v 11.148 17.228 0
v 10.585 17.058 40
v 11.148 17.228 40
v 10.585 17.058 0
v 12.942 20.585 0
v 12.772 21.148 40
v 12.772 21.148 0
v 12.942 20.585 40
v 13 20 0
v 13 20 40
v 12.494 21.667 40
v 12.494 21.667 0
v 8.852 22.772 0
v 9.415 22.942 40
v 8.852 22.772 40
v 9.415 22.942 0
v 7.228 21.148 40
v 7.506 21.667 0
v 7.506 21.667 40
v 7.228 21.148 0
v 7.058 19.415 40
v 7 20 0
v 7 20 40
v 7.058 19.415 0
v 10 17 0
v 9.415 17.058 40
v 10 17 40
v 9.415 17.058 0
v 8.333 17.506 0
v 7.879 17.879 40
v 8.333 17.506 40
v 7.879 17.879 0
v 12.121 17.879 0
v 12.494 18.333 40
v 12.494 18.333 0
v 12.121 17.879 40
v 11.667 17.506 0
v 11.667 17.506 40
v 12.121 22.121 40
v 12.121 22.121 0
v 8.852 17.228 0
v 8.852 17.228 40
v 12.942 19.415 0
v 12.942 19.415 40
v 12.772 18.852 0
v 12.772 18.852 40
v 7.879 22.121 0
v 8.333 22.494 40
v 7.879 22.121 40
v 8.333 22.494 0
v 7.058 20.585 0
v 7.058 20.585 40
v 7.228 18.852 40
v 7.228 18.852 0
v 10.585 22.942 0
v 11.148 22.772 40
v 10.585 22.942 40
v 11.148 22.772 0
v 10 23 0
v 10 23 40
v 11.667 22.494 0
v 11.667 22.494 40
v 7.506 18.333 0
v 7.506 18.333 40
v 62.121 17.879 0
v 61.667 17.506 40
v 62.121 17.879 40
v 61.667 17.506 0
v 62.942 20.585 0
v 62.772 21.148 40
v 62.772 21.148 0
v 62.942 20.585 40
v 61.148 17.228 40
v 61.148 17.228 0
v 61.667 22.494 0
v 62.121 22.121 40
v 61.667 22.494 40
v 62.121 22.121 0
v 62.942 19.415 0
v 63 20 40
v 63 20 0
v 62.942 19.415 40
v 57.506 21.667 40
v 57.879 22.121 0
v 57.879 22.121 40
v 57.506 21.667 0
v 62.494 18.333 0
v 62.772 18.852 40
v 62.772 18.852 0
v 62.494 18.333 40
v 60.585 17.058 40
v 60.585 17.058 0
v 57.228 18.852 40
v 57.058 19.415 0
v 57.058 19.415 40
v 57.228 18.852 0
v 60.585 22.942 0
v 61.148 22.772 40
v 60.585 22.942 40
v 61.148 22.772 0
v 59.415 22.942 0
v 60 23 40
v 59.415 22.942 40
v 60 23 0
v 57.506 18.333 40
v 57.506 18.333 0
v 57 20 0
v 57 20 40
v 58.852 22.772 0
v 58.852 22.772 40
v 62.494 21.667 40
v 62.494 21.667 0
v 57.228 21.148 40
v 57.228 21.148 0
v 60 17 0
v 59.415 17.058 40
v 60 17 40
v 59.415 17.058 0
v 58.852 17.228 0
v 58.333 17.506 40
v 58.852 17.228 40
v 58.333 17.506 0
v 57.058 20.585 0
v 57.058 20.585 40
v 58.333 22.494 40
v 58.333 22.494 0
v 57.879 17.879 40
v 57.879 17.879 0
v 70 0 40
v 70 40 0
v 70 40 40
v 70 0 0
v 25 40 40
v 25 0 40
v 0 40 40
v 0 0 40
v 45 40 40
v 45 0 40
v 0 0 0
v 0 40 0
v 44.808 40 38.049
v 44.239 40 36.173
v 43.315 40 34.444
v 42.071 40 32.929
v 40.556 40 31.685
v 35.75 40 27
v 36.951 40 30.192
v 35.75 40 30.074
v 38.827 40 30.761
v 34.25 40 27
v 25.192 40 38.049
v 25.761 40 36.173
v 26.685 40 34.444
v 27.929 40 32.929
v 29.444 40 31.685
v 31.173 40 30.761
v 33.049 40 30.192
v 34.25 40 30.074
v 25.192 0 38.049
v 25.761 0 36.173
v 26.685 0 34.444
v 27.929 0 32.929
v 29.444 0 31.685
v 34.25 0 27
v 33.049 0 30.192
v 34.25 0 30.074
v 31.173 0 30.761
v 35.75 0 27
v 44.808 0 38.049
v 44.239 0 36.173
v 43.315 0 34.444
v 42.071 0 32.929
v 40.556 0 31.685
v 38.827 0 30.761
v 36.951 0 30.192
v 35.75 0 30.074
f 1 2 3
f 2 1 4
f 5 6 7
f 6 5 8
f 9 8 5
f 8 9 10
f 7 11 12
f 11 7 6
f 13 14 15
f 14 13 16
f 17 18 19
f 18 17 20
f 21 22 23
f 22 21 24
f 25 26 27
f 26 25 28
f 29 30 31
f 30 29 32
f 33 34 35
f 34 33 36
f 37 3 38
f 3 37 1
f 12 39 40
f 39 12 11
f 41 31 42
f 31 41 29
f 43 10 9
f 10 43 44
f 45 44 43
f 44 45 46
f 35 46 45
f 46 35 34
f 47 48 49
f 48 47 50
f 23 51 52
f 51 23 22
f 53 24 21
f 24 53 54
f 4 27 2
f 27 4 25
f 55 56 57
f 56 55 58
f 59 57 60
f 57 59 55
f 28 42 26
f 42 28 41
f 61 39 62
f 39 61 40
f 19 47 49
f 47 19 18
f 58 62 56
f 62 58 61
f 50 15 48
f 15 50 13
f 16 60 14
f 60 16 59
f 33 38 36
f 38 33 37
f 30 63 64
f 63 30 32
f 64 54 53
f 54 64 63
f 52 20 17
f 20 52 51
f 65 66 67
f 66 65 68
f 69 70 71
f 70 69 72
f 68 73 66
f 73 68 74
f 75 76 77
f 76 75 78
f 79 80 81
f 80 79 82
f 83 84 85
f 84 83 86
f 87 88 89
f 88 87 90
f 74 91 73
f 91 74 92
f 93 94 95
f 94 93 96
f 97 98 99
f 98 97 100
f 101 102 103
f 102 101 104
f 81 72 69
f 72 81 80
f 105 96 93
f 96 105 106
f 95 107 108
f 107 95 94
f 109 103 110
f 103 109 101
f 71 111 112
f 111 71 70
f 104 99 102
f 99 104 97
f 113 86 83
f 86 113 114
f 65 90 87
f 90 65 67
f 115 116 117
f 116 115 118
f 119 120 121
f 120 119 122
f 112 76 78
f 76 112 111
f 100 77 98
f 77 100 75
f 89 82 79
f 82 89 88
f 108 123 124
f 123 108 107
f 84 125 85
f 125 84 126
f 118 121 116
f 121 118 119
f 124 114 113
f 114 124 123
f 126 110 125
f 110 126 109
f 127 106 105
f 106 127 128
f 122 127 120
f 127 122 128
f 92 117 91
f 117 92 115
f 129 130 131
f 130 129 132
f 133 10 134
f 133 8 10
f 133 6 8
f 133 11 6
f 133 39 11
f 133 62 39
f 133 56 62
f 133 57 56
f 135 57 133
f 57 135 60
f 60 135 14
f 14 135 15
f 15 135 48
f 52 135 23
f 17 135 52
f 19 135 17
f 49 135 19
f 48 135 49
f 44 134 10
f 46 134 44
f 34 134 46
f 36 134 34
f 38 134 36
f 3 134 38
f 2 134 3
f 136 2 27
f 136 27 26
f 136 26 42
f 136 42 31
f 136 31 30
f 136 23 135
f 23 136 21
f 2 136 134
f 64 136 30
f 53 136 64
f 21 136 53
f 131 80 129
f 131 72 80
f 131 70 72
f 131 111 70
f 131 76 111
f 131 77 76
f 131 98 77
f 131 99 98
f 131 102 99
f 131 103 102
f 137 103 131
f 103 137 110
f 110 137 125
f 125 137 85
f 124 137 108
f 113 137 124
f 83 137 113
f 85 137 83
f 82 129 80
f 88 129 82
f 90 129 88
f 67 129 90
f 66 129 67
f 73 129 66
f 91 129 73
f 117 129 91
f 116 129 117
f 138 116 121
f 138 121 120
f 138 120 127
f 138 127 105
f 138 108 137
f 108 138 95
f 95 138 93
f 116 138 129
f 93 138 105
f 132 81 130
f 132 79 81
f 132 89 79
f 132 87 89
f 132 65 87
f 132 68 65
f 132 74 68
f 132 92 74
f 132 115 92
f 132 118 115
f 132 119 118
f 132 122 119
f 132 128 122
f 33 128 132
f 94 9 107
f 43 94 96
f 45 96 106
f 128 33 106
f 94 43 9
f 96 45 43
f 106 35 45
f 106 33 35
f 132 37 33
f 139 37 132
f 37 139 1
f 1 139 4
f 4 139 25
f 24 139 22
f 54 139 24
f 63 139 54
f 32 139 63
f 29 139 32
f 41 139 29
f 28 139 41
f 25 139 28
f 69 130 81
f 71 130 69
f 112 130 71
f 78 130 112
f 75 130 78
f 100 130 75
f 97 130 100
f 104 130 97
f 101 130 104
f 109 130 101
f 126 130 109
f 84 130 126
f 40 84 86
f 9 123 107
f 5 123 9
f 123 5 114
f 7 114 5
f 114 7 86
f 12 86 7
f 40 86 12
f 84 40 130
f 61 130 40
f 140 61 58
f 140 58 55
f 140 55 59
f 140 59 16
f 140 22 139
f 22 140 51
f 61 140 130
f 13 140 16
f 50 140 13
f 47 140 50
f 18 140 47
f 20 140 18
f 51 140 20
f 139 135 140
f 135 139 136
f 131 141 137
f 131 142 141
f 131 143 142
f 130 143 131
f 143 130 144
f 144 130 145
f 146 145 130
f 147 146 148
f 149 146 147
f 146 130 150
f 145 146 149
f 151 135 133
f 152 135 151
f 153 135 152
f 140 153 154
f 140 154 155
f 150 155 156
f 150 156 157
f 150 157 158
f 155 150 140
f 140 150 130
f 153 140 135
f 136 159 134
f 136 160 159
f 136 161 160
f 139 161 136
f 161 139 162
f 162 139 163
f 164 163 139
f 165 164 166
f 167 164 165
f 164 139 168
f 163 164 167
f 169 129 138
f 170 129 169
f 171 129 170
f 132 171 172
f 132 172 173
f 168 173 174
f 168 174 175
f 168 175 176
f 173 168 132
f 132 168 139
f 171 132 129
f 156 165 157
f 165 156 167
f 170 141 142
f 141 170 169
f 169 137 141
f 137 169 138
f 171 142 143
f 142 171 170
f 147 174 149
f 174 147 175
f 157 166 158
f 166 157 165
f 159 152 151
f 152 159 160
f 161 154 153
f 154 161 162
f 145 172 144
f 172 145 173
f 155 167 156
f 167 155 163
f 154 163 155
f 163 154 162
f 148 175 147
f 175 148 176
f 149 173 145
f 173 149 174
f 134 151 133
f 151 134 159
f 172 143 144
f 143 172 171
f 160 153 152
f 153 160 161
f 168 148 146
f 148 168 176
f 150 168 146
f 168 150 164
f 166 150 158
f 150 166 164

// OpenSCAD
$fn = 32;

// ----------------------------------------------------------------------
// Saddle clamp: split shaft clamp
// ----------------------------------------------------------------------

// --- parameters (mm) ---
blk_l = 70;               // block length, X
blk_w = 40;               // block width, Y
blk_h = 40;               // block height
clamp_r = 10;             // shaft groove radius
hole_r = 3;               // bolt hole radius
hole_m = 10;              // bolt hole margin from the ends
saw_w = 1.5;              // saw kerf width

saw_depth = clamp_r + 3;  // saw kerf depth

difference() {
  cube([blk_l, blk_w, blk_h]);
  translate([blk_l / 2, -1, blk_h])
    rotate([-90, 0, 0])
      cylinder(h = blk_w + 2, r = clamp_r);
  for (sx = [0, 1])
    translate([sx ? blk_l - hole_m : hole_m, blk_w / 2, -1])
      cylinder(r = hole_r, h = blk_h + 2);
  translate([blk_l / 2 - saw_w / 2, -1, blk_h - saw_depth])
    cube([saw_w, blk_w + 2, saw_depth + 1]);
}
